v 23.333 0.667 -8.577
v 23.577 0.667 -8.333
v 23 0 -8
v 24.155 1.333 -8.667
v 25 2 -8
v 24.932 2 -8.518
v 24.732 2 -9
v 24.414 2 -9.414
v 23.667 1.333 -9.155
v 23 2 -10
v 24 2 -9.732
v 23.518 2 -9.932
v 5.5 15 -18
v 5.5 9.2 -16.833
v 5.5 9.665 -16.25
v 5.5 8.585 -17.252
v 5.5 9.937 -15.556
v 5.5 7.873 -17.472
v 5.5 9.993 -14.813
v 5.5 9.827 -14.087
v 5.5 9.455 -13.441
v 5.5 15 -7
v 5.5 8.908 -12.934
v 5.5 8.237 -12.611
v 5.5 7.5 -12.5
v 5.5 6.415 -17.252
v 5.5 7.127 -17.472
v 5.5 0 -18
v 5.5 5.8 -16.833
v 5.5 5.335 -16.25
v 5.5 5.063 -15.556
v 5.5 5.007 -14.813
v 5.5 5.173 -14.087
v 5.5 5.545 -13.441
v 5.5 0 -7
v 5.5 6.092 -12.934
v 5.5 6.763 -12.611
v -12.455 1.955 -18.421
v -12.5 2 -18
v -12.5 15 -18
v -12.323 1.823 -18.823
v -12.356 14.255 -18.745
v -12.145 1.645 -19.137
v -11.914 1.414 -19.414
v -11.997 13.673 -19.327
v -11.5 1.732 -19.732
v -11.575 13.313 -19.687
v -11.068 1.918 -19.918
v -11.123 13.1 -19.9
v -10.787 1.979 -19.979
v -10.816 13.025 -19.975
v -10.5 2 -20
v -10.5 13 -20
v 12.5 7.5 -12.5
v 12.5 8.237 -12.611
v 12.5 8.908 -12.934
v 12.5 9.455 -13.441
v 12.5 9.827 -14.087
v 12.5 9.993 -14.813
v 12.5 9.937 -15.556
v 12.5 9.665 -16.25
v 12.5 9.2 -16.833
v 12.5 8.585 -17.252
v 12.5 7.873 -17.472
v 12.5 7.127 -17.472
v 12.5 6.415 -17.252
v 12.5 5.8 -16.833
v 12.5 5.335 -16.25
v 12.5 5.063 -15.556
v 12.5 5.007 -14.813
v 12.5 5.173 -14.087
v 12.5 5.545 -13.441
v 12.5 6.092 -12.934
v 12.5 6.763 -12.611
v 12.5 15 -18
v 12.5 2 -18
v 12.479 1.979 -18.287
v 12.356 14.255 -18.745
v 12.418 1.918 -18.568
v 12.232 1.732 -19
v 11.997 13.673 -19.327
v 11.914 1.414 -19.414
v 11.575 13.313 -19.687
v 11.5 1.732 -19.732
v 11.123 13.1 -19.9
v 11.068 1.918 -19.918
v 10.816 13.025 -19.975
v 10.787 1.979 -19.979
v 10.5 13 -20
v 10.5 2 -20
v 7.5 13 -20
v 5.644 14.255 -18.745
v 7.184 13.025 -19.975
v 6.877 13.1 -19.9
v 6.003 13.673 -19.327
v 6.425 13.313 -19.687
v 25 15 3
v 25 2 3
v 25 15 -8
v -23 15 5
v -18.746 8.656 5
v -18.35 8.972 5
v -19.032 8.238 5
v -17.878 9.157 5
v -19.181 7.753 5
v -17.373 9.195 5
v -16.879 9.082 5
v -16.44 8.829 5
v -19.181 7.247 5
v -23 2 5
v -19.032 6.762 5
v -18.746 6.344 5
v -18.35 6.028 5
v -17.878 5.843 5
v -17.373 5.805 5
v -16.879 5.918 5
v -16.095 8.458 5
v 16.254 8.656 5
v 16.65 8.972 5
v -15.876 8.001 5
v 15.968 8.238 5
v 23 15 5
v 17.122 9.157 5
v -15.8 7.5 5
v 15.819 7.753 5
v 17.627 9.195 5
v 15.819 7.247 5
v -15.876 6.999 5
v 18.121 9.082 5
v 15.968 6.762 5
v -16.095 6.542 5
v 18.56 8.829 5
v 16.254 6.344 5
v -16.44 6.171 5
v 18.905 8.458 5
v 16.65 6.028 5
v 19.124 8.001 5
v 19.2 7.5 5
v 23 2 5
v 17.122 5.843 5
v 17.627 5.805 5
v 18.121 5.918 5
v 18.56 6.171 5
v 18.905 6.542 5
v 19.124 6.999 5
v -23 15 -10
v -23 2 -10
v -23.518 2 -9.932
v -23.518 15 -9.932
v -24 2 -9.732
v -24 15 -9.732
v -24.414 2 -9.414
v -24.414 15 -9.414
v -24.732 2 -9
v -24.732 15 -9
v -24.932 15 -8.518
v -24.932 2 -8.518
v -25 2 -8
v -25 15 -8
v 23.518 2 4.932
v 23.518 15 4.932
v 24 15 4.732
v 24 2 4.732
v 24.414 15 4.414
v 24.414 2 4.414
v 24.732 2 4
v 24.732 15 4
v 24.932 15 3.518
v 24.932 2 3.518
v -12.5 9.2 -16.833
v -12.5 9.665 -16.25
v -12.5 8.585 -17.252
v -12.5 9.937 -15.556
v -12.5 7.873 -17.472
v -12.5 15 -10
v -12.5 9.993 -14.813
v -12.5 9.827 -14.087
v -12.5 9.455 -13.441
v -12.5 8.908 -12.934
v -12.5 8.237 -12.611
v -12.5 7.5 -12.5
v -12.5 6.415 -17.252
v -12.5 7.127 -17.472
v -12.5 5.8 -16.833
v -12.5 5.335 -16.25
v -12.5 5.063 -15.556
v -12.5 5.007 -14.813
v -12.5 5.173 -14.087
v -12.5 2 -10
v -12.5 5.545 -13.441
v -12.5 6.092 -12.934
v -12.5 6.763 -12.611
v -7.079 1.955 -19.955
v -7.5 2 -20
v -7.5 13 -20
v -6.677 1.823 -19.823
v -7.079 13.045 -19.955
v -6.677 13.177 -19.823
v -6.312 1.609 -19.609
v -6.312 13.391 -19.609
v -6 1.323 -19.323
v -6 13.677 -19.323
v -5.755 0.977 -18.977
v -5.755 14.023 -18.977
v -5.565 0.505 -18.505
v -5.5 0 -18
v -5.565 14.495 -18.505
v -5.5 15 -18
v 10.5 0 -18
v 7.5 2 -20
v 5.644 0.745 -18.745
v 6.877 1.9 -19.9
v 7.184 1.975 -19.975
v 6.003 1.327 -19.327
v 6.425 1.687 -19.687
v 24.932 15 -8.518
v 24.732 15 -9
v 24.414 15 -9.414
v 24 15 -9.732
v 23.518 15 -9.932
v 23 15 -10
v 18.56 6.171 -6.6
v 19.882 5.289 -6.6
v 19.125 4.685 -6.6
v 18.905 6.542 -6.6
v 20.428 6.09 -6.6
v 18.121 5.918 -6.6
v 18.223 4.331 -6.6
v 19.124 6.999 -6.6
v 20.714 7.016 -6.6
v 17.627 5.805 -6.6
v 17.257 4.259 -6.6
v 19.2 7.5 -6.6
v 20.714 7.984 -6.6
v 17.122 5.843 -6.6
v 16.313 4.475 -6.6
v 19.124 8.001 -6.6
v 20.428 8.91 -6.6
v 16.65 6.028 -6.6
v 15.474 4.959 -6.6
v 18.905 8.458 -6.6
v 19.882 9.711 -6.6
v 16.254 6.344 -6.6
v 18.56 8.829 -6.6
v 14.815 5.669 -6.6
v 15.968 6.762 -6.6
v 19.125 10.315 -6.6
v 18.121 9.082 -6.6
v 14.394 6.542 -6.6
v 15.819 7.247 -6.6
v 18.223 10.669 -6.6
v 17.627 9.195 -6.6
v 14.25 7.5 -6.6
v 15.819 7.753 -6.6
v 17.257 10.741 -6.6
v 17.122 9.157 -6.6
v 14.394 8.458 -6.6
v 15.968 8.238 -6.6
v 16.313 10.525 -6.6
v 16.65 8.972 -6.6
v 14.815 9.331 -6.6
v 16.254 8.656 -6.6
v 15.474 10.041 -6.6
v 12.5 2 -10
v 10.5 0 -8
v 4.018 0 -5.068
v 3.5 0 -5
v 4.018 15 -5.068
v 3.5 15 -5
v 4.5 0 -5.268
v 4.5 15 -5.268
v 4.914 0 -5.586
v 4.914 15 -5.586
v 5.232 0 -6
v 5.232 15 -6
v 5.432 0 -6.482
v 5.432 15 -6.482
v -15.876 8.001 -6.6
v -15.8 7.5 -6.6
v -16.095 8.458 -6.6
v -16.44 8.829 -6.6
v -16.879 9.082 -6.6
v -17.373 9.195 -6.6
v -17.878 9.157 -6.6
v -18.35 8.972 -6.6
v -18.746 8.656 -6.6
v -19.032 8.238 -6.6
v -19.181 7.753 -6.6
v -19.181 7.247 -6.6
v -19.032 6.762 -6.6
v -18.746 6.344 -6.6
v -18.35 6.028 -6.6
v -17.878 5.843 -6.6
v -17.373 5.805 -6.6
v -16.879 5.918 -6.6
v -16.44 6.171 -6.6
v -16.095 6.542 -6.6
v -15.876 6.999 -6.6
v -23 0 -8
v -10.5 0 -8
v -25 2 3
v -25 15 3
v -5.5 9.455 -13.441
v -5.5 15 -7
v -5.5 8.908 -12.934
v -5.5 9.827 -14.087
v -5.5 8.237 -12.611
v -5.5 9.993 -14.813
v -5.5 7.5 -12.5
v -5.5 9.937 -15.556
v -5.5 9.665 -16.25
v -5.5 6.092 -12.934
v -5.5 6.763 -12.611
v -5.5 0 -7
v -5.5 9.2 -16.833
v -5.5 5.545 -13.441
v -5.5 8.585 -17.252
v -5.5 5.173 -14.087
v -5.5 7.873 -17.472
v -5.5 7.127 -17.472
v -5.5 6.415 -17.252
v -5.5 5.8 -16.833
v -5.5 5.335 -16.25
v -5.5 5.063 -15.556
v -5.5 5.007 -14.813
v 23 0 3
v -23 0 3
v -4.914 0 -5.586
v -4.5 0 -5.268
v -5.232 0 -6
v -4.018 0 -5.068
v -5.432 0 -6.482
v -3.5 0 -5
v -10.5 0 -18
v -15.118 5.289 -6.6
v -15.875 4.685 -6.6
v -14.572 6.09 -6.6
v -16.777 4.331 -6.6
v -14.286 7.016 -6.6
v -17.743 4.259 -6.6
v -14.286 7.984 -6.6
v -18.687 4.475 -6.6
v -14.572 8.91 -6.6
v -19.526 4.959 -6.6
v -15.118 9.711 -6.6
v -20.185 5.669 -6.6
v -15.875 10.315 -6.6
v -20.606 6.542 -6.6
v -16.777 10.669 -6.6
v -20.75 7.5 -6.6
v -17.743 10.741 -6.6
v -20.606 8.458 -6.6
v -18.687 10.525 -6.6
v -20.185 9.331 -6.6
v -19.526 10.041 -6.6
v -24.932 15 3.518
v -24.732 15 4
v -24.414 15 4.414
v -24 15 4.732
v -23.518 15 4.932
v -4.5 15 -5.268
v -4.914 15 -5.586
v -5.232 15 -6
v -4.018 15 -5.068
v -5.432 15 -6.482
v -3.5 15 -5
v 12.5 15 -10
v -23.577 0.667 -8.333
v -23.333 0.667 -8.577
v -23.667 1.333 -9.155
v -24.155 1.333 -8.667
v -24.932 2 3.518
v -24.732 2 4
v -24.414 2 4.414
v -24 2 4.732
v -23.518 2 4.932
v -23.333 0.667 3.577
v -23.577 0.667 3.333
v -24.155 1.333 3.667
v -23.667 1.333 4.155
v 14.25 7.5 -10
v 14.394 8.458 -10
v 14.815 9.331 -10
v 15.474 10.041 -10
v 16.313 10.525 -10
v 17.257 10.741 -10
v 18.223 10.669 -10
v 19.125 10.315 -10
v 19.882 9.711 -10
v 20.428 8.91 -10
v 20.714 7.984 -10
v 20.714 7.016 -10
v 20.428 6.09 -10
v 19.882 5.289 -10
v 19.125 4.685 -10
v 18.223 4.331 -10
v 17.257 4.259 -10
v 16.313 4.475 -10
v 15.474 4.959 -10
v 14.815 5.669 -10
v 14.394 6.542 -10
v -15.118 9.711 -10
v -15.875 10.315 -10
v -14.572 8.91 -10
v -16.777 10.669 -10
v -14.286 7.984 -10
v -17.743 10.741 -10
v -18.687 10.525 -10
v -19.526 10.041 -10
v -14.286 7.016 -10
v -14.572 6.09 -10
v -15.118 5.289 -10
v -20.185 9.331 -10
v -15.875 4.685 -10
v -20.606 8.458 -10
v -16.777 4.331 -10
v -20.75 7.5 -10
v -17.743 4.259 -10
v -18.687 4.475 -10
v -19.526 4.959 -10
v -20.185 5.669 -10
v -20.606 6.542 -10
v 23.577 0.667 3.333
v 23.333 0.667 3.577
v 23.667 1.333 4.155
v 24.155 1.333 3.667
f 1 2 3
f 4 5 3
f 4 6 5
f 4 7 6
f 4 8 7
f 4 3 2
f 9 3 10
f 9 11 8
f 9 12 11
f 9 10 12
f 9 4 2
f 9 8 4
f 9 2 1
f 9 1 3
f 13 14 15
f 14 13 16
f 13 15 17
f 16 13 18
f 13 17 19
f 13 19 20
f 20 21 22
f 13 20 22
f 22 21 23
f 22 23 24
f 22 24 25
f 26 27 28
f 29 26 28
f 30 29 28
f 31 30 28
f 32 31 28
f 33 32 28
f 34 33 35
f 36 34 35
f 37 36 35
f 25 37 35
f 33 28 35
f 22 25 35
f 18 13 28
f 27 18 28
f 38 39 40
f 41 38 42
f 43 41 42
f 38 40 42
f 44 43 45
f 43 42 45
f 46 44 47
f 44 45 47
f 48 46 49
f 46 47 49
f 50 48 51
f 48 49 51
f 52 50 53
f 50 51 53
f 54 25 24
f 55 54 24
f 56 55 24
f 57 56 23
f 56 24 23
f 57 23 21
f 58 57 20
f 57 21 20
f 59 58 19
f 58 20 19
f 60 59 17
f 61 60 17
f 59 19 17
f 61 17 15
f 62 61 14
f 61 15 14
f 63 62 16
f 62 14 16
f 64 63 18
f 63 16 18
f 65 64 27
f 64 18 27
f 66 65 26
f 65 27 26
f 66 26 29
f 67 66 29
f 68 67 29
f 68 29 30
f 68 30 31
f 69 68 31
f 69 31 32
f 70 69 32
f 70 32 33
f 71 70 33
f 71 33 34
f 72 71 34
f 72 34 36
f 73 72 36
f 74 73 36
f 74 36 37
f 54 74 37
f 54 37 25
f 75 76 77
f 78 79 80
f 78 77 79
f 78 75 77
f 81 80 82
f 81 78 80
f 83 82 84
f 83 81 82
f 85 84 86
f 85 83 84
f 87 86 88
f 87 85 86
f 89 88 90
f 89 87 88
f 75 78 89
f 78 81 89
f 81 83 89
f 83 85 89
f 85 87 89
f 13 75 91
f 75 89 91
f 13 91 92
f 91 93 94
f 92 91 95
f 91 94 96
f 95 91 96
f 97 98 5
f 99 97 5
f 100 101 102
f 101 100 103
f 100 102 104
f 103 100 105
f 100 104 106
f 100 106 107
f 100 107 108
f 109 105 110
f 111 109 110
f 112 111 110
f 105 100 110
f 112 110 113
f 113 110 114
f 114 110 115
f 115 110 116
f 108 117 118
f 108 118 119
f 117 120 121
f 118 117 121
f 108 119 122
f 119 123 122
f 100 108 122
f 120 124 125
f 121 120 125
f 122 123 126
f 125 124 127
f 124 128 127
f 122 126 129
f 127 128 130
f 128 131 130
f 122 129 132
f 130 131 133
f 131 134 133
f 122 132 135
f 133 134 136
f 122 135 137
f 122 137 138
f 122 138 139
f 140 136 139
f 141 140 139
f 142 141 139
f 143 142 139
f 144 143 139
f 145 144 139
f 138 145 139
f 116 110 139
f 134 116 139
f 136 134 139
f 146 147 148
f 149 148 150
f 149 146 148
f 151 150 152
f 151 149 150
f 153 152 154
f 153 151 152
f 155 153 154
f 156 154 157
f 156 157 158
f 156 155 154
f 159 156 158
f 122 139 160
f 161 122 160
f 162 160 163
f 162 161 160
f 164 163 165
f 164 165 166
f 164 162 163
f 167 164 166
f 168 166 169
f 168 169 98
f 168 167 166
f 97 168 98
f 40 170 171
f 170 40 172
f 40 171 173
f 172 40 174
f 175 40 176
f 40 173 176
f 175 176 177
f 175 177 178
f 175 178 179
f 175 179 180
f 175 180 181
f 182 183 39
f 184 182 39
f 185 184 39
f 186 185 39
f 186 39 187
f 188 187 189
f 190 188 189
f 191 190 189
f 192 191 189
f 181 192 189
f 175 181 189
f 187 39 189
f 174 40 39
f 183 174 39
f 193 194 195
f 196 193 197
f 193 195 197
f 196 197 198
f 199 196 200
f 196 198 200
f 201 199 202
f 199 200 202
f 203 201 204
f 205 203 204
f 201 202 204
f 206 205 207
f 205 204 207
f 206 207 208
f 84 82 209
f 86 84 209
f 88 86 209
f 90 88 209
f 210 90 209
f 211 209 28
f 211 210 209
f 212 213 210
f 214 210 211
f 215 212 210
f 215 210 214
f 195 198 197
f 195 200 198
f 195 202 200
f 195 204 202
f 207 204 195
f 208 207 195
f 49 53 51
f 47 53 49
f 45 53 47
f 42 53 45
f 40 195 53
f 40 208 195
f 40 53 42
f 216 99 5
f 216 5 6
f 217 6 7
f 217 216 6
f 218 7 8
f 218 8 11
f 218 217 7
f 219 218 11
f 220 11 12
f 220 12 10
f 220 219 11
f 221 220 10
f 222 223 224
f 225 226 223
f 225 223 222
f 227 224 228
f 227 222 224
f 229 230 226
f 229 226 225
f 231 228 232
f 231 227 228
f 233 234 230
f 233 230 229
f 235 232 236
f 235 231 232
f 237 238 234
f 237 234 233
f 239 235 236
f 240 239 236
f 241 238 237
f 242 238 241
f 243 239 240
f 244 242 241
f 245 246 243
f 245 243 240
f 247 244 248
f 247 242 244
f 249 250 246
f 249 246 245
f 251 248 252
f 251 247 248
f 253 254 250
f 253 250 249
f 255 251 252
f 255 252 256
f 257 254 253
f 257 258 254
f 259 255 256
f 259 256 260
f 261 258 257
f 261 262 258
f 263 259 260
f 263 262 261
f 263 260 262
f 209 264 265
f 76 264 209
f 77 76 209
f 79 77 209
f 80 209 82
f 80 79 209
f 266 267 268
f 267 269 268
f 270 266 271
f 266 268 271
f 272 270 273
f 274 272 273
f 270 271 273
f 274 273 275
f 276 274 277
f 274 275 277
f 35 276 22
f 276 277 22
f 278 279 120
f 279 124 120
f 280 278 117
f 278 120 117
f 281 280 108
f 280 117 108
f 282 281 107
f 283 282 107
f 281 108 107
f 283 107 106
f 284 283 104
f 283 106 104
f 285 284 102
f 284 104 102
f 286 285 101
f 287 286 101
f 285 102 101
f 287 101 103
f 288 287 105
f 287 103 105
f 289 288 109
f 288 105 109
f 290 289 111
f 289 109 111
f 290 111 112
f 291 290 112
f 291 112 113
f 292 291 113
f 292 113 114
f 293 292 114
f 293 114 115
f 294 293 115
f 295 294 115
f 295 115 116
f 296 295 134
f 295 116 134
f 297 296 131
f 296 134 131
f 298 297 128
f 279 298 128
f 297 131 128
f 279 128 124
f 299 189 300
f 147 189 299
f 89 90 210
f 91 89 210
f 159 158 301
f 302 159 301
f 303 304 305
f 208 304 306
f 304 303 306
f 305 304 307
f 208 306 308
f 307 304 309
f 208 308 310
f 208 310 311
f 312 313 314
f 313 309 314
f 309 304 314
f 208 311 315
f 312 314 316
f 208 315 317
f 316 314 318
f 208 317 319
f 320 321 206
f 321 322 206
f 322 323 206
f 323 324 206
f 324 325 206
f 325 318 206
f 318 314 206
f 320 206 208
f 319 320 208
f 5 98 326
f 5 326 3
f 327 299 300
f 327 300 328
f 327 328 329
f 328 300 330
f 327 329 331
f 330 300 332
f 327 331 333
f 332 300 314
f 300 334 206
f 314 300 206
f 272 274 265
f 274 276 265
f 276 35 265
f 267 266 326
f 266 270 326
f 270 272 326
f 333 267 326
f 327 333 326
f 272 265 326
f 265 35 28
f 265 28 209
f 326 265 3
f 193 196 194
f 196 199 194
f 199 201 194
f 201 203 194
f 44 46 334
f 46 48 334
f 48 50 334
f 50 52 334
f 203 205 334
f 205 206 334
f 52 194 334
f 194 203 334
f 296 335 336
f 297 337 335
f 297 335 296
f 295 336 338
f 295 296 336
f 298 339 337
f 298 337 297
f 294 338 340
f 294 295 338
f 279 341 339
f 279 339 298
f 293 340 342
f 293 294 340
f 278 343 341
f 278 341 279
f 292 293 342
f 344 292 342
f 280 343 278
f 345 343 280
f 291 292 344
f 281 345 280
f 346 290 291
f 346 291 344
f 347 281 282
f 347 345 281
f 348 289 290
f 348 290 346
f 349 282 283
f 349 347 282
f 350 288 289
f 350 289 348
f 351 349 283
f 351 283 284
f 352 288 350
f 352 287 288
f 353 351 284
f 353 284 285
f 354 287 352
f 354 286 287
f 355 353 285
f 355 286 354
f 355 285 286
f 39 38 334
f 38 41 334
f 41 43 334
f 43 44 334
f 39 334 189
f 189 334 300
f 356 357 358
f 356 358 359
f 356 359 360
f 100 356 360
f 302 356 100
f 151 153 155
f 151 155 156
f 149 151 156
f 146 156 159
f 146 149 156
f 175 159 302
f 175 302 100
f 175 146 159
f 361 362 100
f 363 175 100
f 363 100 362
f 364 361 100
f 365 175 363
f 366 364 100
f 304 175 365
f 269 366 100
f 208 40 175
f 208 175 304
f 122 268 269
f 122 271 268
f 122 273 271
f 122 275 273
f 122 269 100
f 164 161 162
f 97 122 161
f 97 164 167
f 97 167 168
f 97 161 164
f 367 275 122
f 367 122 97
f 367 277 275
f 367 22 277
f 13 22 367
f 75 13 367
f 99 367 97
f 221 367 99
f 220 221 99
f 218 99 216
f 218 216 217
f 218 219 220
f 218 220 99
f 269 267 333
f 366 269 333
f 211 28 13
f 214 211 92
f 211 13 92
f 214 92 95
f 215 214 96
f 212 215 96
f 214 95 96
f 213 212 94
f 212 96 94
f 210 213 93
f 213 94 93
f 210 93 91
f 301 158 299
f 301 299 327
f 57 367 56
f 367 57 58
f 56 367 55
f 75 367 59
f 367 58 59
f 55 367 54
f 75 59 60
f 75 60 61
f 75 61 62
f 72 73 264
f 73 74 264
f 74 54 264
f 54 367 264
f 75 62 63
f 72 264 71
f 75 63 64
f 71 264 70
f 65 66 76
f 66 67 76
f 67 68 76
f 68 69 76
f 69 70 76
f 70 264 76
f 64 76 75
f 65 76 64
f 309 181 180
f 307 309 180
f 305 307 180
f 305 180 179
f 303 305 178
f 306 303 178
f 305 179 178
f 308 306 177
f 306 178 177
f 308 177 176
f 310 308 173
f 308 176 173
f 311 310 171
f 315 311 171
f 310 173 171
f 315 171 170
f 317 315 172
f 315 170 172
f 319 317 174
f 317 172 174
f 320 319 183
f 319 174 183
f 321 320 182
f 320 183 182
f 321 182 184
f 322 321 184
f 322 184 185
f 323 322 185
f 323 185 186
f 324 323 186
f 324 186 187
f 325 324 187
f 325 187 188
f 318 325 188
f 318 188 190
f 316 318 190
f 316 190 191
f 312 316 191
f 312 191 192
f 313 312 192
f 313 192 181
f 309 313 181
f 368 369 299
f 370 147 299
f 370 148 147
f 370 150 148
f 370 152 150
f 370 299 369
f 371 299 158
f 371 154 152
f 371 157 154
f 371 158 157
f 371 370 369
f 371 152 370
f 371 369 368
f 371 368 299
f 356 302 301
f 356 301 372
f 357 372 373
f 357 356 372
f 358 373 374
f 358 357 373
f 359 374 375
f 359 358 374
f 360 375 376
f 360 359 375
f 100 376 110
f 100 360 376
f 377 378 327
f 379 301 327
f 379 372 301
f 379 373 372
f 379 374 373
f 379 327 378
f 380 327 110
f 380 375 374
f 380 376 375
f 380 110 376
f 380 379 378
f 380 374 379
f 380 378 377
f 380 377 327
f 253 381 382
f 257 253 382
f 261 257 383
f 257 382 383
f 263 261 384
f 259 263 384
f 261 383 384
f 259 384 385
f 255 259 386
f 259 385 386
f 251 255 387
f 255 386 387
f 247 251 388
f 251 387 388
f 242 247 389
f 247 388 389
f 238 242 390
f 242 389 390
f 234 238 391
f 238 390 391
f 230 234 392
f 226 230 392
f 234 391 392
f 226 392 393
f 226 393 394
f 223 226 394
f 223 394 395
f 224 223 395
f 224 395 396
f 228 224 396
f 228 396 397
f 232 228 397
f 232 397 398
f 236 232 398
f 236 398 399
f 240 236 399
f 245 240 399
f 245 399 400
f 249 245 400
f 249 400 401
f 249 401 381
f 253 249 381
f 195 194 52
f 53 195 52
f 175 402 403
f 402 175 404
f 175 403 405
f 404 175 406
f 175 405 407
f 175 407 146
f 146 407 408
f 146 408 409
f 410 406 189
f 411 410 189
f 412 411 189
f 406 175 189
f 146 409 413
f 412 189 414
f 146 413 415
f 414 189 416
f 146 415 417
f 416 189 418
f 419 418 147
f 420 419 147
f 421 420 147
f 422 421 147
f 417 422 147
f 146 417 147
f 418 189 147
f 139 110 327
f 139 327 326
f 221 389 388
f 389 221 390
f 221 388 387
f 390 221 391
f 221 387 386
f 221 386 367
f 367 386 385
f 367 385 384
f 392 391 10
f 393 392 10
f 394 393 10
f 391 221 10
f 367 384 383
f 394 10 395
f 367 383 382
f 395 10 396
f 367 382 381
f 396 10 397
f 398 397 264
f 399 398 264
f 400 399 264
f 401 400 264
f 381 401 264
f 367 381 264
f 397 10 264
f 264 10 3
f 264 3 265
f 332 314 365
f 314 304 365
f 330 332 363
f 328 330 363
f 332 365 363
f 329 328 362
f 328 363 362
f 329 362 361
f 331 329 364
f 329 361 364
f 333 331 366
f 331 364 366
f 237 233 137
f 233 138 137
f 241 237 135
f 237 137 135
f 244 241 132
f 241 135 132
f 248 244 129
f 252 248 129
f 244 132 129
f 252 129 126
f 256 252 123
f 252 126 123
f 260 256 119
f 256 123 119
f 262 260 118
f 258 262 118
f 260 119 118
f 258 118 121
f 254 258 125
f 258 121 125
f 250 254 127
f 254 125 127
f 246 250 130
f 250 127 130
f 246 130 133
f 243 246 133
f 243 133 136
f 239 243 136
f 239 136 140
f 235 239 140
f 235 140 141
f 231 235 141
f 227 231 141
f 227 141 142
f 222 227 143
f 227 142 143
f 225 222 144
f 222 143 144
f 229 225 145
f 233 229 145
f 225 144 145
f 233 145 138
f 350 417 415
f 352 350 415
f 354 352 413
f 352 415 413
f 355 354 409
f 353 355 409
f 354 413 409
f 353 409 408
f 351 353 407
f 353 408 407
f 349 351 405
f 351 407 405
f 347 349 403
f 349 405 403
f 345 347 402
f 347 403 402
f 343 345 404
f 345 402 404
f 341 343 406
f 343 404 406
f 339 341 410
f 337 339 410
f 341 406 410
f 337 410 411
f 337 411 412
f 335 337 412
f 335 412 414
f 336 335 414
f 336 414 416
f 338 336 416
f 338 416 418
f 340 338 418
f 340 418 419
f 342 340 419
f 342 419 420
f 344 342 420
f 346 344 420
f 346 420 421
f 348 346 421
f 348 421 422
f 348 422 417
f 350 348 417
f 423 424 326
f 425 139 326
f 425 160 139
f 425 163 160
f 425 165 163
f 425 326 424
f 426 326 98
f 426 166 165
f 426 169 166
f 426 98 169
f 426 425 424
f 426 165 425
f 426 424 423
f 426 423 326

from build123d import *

# Parameters (mm, degrees)
MAIN_BLOCK_DEPTH                = 15
TENSION_SCREW_HOLES_D           = 3.4
TENSION_SCREW_HOLES_CBORE_D     = 6.5
TENSION_SCREW_HOLES_CBORE_DEPTH = 3.4
IDLER_MOUNTING_HOLE_D           = 5
COSMETIC_CHAMFER_SIZE           = 2
PRINT_HELPER_FILLETS_R          = 2
COSMETIC_CHAMFERS_SIZE          = 2


with BuildPart() as part:
    # Main Body Sketch → Main Block (new body)
    with BuildSketch(Plane(origin=(0, 0, 0), x_dir=(1, 0, 0), z_dir=(0, 1, 0))):
        Polygon((-12.5, 20), (-12.5, 10), (-25, 10), (-25, 0), (-25, -5), (25, -5), (25, 10), (12.5, 10), (12.5, 20), (5.5, 20), (5.5, 5), (-5.5, 5), (-5.5, 20), align=None)
    extrude(amount=MAIN_BLOCK_DEPTH)

    # Tension Screw Holes (through all)
    with Locations(Plane(origin=(0, 0, -10), x_dir=(-1, 0, 0), z_dir=(0, 0, -1))):
        with Locations((17.5, 7.5), (-17.5, 7.5)):
            CounterBoreHole(TENSION_SCREW_HOLES_D / 2, TENSION_SCREW_HOLES_CBORE_D / 2, TENSION_SCREW_HOLES_CBORE_DEPTH)

    # Idler Mounting Hole (through all)
    with Locations(Plane(origin=(12.5, 0, 0), x_dir=(0, 0, -1), z_dir=(1, 0, 0))):
        with Locations((15, 7.5)):
            Hole(IDLER_MOUNTING_HOLE_D / 2)

    # Cosmetic Chamfer
    cosmetic_chamfer_edges = [part.edges().sort_by_distance(p)[0] for p in [
        (9, 0, -20),
        (-9, 0, -20),
        (9, 15, -20),
        (-9, 15, -20),
    ]]
    chamfer(cosmetic_chamfer_edges, length=COSMETIC_CHAMFER_SIZE)

    # Print Helper Fillets
    print_helper_fillets_edges = [part.edges().sort_by_distance(p)[0] for p in [
        (-5.5, 7.5, -5),
        (5.5, 7.5, -5),
        (-12.5, 7.5, -20),
        (-5.5, 7.5, -20),
        (5.5, 7.5, -20),
        (12.5, 7.5, -20),
        (-25, 7.5, 5),
        (25, 7.5, -10),
        (25, 7.5, 5),
        (-25, 7.5, -10),
    ]]
    fillet(print_helper_fillets_edges, radius=PRINT_HELPER_FILLETS_R)

    # Cosmetic Chamfers
    cosmetic_chamfers_edges = [part.edges().sort_by_distance(p)[0] for p in [
        (-17.75, 0, -10),
        (-24.414213562, 0, -9.414213562),
        (-25, 0, -2.5),
        (-24.414213562, 0, 4.414213562),
        (0, 0, 5),
        (17.75, 0, -10),
        (24.414213562, 0, 4.414213562),
        (24.414213562, 0, -9.414213562),
        (25, 0, -2.5),
        (-12.5, 0, -14),
        (12.5, 0, -14),
    ]]
    chamfer(cosmetic_chamfers_edges, length=COSMETIC_CHAMFERS_SIZE - 0.0001)  # a hair under: the kernel refuses the full size


solid = part.part
